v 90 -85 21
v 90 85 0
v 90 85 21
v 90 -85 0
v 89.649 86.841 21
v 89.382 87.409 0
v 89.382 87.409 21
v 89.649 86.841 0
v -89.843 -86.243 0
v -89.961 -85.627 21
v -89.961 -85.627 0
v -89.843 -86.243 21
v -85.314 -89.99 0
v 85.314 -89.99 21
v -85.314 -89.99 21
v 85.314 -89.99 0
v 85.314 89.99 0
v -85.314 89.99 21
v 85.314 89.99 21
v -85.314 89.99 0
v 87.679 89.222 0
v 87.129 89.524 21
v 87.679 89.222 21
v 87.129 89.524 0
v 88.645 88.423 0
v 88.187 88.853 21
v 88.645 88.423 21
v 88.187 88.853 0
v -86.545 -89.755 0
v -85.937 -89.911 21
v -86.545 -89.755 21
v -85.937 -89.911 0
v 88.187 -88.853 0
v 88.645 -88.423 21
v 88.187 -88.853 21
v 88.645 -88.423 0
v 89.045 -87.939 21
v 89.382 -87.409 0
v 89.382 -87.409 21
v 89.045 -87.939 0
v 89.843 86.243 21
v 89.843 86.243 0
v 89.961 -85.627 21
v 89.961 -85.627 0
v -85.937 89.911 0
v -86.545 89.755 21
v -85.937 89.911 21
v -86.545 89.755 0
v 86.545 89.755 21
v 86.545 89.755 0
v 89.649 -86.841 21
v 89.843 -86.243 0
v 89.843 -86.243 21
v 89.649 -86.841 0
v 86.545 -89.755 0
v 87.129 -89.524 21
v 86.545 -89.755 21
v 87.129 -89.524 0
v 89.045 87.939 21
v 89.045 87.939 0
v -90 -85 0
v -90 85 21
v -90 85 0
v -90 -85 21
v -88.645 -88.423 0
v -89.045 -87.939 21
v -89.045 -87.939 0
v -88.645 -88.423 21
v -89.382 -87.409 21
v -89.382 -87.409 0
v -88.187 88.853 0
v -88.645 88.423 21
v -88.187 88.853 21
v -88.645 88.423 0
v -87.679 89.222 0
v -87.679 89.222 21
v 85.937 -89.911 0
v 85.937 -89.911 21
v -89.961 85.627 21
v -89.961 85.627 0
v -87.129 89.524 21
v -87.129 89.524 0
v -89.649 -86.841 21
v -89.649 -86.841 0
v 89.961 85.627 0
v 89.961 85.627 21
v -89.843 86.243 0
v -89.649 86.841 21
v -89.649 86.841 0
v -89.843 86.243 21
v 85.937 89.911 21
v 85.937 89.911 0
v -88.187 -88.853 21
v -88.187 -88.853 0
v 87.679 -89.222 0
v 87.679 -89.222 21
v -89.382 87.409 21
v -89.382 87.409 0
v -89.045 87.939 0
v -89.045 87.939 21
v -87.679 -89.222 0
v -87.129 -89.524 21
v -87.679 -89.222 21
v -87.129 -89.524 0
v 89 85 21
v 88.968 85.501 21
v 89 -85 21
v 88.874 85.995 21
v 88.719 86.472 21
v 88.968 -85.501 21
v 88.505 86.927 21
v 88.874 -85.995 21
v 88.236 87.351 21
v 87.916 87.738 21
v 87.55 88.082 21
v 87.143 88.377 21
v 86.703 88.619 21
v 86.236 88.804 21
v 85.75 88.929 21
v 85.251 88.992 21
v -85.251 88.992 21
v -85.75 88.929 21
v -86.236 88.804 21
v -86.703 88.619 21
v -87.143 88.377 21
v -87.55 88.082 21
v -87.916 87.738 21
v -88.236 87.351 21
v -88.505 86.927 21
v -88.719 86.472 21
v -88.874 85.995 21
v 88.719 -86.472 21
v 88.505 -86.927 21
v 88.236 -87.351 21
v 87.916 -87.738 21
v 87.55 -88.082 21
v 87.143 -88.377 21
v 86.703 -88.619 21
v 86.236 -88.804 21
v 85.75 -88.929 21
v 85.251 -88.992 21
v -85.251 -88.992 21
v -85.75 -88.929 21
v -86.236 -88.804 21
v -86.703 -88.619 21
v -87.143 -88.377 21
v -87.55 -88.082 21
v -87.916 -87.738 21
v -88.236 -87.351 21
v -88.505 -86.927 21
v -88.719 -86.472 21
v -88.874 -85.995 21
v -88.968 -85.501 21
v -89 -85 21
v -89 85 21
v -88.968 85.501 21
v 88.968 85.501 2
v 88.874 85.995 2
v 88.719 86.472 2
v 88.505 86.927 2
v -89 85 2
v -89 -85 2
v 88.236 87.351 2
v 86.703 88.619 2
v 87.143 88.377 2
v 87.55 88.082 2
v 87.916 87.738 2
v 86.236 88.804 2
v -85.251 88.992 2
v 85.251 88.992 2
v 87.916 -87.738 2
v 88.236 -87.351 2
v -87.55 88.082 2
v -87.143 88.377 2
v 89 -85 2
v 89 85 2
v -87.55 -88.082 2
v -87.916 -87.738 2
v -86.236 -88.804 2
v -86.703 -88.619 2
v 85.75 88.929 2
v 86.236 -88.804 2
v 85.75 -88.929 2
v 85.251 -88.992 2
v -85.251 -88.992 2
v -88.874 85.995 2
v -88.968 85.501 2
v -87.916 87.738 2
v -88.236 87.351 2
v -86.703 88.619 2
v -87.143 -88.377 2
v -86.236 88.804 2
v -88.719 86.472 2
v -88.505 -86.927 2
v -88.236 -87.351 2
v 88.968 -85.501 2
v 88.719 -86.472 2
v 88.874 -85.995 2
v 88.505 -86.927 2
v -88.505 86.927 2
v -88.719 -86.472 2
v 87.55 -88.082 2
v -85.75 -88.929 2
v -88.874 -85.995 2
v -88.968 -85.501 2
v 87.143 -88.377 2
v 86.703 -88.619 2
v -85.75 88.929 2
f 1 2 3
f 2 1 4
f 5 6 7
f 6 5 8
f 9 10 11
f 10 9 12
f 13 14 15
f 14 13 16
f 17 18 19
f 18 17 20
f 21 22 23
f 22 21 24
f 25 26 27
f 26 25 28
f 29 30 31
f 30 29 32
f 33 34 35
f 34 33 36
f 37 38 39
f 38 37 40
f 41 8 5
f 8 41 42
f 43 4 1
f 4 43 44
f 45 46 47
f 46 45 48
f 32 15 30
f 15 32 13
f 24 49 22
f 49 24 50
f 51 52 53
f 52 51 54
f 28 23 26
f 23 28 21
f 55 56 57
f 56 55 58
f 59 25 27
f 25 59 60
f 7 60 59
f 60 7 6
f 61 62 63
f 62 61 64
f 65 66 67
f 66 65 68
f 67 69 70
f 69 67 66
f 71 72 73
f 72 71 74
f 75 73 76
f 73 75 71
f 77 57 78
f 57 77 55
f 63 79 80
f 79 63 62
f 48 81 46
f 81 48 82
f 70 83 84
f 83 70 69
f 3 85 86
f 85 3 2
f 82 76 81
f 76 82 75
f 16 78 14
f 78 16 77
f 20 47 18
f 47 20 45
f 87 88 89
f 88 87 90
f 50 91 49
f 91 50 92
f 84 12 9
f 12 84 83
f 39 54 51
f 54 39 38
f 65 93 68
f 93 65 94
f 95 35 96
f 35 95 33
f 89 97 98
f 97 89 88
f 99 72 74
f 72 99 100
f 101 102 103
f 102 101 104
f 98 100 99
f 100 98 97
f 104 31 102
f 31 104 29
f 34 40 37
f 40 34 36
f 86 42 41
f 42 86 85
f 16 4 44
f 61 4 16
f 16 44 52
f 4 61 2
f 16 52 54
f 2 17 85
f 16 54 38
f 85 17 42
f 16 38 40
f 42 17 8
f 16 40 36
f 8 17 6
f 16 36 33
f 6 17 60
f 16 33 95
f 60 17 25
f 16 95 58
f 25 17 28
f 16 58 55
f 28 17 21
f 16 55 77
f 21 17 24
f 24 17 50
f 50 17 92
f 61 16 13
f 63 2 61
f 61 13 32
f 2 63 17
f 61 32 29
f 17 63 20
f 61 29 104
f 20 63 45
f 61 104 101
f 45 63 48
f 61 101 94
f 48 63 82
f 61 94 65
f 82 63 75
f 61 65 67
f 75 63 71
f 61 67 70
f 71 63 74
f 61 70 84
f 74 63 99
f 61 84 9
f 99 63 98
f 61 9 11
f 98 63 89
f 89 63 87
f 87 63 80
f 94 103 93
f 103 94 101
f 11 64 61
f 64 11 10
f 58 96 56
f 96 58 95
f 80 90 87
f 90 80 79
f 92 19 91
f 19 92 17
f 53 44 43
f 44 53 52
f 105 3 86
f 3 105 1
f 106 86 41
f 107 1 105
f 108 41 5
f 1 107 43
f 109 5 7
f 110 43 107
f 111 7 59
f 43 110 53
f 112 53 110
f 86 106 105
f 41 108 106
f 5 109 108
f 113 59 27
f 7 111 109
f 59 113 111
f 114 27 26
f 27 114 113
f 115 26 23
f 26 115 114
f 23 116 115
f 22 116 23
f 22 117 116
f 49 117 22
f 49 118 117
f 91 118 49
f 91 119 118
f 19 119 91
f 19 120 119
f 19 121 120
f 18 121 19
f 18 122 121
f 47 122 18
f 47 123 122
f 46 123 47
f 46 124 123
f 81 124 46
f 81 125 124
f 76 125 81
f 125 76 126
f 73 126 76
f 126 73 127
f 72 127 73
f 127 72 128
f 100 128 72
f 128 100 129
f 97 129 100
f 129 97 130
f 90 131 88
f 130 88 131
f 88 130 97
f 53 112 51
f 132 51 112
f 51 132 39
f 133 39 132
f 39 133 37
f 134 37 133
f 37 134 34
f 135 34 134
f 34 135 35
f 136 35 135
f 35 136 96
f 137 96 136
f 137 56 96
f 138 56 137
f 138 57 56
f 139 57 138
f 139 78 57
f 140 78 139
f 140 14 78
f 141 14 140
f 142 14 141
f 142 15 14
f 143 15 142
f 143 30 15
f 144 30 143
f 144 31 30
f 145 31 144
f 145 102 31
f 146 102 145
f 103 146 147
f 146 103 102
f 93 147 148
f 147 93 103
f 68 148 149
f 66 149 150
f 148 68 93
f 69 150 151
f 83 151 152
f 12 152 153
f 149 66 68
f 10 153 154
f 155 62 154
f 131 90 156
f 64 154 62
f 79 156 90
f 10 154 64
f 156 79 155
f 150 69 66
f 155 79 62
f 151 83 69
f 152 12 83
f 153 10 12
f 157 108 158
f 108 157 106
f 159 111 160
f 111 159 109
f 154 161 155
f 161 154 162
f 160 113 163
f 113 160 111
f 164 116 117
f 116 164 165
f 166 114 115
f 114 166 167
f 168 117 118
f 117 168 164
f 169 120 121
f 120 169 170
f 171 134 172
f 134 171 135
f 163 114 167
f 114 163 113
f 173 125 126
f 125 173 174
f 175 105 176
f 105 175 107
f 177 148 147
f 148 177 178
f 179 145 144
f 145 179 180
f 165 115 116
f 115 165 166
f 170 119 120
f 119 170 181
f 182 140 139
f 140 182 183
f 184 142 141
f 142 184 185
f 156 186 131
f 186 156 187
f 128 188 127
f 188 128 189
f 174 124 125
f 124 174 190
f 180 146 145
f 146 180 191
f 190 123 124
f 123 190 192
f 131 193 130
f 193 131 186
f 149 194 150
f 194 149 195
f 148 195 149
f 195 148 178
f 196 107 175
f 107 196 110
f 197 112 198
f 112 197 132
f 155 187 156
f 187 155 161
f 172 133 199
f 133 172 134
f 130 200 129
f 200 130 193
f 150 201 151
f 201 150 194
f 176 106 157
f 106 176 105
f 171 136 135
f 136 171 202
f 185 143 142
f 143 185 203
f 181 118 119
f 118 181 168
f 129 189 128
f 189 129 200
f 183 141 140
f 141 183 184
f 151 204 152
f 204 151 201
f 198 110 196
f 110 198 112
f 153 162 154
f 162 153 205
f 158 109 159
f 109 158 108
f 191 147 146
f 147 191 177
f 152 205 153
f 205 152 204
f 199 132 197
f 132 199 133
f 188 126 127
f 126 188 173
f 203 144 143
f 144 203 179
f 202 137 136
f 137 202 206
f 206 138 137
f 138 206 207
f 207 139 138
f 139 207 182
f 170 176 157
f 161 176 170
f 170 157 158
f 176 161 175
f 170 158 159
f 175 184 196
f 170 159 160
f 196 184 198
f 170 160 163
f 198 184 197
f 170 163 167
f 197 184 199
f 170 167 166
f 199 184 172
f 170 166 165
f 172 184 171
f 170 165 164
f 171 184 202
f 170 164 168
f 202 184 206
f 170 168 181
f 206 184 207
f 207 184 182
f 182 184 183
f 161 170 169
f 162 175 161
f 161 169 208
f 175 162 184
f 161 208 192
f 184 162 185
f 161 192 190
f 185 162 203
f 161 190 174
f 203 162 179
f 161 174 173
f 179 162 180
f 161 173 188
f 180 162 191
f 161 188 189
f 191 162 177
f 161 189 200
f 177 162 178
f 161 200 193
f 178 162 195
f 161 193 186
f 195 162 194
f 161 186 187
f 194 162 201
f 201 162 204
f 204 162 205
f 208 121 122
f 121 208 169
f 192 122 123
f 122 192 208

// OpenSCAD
$fn = 50;


difference() {
	union() {
		hull() {
			translate(v = [-85.0000000000, 85.0000000000, 0]) {
				cylinder(h = 21, r = 5);
			}
			translate(v = [85.0000000000, 85.0000000000, 0]) {
				cylinder(h = 21, r = 5);
			}
			translate(v = [-85.0000000000, -85.0000000000, 0]) {
				cylinder(h = 21, r = 5);
			}
			translate(v = [85.0000000000, -85.0000000000, 0]) {
				cylinder(h = 21, r = 5);
			}
		}
	}
	union() {
		translate(v = [0, 0, 2]) {
			hull() {
				translate(v = [-85.0000000000, 85.0000000000, 0]) {
					cylinder(h = 19, r = 4);
				}
				translate(v = [85.0000000000, 85.0000000000, 0]) {
					cylinder(h = 19, r = 4);
				}
				translate(v = [-85.0000000000, -85.0000000000, 0]) {
					cylinder(h = 19, r = 4);
				}
				translate(v = [85.0000000000, -85.0000000000, 0]) {
					cylinder(h = 19, r = 4);
				}
			}
		}
	}
}
